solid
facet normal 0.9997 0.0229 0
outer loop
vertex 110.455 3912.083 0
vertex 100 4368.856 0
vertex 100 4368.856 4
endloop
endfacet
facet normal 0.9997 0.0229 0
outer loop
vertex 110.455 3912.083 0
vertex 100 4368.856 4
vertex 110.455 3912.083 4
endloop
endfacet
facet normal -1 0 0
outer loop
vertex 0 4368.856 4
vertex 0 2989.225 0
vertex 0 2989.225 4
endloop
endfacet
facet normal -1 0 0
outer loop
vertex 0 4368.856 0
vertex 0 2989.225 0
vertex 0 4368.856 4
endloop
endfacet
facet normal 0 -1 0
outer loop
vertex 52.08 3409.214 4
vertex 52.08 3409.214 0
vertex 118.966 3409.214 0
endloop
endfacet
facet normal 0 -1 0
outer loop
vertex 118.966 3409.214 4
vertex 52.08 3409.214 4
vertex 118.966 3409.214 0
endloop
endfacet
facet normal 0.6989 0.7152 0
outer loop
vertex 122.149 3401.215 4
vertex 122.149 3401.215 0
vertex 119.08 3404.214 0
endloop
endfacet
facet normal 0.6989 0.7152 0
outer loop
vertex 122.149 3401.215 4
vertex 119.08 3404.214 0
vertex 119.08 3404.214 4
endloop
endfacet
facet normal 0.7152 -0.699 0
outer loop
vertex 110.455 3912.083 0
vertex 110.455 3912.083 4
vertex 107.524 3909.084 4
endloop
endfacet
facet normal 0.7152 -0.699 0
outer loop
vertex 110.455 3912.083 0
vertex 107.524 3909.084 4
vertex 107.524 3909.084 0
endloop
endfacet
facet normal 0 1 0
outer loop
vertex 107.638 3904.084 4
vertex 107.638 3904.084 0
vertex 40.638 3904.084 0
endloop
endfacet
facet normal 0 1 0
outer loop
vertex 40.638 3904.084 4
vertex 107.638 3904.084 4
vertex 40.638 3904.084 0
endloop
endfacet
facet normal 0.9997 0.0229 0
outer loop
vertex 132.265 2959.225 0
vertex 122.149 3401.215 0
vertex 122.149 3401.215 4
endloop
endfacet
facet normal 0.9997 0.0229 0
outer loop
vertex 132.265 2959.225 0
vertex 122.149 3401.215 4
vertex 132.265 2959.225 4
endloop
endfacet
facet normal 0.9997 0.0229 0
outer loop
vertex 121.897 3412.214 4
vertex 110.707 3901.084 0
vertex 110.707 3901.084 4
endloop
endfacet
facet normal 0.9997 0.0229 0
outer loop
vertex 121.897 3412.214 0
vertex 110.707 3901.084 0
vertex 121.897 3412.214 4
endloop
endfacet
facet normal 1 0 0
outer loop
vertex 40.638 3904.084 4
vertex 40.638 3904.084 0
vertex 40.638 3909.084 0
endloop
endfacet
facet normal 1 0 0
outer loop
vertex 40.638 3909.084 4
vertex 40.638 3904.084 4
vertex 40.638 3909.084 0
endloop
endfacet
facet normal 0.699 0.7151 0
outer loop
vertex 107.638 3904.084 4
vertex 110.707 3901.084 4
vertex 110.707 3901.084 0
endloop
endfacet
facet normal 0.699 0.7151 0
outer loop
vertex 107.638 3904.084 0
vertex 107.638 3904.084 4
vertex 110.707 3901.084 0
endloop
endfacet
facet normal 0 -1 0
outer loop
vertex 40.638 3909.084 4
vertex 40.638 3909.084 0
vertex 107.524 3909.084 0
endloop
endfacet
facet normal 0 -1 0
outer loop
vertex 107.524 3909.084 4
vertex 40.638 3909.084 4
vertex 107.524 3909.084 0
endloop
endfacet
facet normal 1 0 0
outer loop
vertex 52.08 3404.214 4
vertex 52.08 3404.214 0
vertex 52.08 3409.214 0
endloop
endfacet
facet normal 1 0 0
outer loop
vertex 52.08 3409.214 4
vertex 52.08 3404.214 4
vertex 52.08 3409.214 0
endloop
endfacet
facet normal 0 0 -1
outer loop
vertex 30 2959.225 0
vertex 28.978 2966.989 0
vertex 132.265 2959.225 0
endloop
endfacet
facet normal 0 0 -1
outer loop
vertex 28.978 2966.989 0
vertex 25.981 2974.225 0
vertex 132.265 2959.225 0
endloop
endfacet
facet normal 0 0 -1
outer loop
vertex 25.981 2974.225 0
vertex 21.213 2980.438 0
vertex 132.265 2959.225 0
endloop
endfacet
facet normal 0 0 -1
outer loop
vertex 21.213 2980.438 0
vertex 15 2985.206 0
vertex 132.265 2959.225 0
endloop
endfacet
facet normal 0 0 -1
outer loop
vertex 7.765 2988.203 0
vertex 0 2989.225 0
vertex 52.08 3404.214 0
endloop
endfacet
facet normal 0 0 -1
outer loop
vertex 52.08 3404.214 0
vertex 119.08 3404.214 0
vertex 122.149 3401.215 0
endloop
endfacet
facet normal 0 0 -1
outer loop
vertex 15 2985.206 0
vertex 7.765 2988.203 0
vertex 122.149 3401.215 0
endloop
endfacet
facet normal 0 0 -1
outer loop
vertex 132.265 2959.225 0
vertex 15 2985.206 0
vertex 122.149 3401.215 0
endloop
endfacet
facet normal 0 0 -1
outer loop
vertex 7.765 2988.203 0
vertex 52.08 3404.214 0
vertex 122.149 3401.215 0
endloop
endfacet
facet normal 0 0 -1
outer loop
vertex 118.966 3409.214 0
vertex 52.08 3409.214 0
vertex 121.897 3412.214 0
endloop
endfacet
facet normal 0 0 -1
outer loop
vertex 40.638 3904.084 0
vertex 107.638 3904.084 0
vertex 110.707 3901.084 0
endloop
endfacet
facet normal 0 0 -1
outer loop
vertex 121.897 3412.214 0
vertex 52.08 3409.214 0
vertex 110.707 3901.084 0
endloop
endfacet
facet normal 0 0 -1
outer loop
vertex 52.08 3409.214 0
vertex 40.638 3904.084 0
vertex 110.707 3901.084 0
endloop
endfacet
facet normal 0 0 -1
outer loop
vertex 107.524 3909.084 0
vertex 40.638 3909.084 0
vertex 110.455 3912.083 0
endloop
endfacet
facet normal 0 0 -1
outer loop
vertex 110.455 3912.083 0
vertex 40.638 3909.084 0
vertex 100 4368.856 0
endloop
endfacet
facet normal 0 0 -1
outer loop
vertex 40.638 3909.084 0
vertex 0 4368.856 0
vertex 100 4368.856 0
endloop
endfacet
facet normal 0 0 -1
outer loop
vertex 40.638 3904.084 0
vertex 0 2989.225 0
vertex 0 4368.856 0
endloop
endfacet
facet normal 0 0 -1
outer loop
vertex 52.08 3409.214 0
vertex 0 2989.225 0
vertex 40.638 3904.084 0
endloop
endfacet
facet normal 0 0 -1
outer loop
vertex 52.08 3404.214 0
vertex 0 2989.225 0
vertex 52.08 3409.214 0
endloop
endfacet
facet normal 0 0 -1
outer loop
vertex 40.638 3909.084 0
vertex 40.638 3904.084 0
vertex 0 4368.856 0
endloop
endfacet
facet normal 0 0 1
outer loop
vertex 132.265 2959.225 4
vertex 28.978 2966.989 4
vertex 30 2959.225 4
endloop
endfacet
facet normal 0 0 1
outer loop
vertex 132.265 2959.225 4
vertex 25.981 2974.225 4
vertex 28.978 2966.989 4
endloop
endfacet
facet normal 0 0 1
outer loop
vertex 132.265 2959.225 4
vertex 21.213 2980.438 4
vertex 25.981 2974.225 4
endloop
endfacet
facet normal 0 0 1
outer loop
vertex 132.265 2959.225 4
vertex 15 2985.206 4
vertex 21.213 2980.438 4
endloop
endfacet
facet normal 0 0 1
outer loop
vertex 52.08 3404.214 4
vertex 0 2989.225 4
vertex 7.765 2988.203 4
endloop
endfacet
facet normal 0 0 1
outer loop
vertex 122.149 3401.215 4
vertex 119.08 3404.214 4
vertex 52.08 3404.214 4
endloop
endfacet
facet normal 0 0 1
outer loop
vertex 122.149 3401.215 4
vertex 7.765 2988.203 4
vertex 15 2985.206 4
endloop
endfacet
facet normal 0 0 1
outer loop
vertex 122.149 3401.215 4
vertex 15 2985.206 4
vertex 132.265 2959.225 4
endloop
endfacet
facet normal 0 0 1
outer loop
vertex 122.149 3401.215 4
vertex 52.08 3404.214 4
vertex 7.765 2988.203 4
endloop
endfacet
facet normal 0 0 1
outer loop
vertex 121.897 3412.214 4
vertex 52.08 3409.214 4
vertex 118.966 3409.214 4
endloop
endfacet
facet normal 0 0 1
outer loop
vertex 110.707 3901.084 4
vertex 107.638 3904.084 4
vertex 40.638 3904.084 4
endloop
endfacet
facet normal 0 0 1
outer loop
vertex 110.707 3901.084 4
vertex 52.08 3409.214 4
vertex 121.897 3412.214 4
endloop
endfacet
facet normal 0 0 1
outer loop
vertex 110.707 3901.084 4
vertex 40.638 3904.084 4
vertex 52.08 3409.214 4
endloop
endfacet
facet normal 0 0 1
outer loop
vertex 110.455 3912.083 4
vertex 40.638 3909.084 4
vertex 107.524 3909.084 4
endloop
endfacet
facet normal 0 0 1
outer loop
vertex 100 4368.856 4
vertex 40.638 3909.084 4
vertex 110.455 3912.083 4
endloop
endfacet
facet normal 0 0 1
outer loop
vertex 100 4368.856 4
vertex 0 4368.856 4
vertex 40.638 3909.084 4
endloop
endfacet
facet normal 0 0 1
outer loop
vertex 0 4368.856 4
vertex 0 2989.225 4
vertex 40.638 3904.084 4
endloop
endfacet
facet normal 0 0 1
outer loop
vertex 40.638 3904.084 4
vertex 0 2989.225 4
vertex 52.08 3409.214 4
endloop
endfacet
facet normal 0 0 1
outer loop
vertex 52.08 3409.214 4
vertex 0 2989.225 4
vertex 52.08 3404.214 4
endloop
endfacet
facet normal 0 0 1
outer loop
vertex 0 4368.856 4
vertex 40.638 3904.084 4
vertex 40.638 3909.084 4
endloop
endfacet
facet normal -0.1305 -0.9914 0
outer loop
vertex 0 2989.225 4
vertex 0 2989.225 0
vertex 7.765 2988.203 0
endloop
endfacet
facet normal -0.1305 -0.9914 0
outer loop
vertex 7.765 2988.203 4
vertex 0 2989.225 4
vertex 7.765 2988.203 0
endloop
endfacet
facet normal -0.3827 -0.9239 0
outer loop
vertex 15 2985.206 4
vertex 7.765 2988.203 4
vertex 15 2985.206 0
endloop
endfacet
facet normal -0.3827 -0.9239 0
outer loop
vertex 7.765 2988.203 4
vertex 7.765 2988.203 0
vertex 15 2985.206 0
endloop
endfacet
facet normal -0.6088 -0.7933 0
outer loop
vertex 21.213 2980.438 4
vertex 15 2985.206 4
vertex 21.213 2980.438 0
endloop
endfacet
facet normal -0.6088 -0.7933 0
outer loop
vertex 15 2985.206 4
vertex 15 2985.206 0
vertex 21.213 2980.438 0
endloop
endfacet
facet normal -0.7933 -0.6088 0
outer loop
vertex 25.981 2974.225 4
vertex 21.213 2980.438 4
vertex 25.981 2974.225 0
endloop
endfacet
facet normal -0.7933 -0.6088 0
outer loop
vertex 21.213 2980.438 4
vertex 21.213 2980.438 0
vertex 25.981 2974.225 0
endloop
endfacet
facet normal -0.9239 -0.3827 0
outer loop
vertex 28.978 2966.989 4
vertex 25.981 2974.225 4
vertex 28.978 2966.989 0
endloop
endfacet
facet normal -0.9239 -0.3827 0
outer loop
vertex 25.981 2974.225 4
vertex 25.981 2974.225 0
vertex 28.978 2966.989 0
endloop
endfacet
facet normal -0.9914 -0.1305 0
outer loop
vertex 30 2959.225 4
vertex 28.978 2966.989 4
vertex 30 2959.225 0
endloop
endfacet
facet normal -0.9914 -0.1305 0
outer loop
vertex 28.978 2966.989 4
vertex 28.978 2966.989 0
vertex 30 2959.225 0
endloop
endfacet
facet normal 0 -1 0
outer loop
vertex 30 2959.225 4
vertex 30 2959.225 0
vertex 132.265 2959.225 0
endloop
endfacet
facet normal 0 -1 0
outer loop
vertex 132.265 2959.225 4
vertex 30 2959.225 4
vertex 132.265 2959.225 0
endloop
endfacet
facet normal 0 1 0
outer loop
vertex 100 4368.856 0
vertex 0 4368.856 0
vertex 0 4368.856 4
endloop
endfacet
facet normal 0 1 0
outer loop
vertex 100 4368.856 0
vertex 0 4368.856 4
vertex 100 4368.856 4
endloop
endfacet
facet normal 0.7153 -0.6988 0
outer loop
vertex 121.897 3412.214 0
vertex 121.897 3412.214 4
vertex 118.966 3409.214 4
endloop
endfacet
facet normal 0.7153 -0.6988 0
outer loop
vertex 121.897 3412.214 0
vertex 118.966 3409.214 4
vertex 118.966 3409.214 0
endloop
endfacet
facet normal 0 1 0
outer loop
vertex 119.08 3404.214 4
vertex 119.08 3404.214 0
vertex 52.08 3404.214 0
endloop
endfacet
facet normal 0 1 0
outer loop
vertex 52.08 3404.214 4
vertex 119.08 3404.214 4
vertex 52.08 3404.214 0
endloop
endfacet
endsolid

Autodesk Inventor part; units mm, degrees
ref_plane "YZ Plane" through (0, 0, 0) normal (1, 0, 0) x (0, 1, 0)
ref_plane "XZ Plane" through (0, 0, 0) normal (0, 1, 0) x (-1, 0, 0)
ref_plane "XY Plane" through (0, 0, 0) normal (0, 0, 1) x (1, 0, 0)
sketch "Sketch1" plane through (0, 0, 0) normal (0, 0, 1) x (1, 0, 0)
  line L0 (0, 0) -> (0, 4368.8557)
  line L1 (0, 4368.8557) -> (100, 4368.8557)
  line L2 (100, 4368.8557) -> (200, 0)
  line L3 (200, 0) -> (0, 0)
  circle A0 centre (0, 0) radius 30
  line L4 (0, 1479.6125) -> (166.1327, 1479.6125)
  line L5 (0, 2959.2249) -> (132.2654, 2959.2249)
  circle A1 centre (0, 1479.6125) radius 30
  circle A2 centre (0, 2959.2249) radius 30
  line L6 (190.7298, 405) -> (120.7298, 405)
  line L7 (120.7298, 405) -> (120.7298, 410)
  line L8 (120.7298, 410) -> (190.7298, 410)
  line L9 (190.7298, 410) -> (190.7298, 405)
  line L10 (109.2882, 909.8691) -> (179.2882, 909.8691)
  line L11 (179.2882, 904.8691) -> (109.2882, 904.8691)
  line L12 (109.2882, 904.8691) -> (109.2882, 909.8691)
  line L13 (179.2882, 909.8691) -> (179.2882, 904.8691)
  line L14 (97.8465, 1409.7381) -> (167.8465, 1409.7381)
  line L15 (167.8465, 1404.7381) -> (97.8465, 1404.7381)
  line L16 (97.8465, 1404.7381) -> (97.8465, 1409.7381)
  line L17 (167.8465, 1409.7381) -> (167.8465, 1404.7381)
  line L18 (86.4049, 1909.6072) -> (156.4049, 1909.6072)
  line L19 (156.4049, 1904.6072) -> (86.4049, 1904.6072)
  line L20 (86.4049, 1904.6072) -> (86.4049, 1909.6072)
  line L21 (156.4049, 1909.6072) -> (156.4049, 1904.6072)
  line L22 (74.9632, 2409.4763) -> (144.9632, 2409.4763)
  line L23 (144.9632, 2404.4763) -> (74.9632, 2404.4763)
  line L24 (74.9632, 2404.4763) -> (74.9632, 2409.4763)
  line L25 (144.9632, 2409.4763) -> (144.9632, 2404.4763)
  line L26 (63.5216, 2909.3454) -> (133.5216, 2909.3454)
  line L27 (133.5216, 2904.3454) -> (63.5216, 2904.3454)
  line L28 (63.5216, 2904.3454) -> (63.5216, 2909.3454)
  line L29 (133.5216, 2909.3454) -> (133.5216, 2904.3454)
  line L30 (52.08, 3409.2144) -> (122.08, 3409.2144)
  line L31 (122.08, 3404.2144) -> (52.08, 3404.2144)
  line L32 (52.08, 3404.2144) -> (52.08, 3409.2144)
  line L33 (122.08, 3409.2144) -> (122.08, 3404.2144)
  line L34 (40.6383, 3909.0835) -> (110.6383, 3909.0835)
  line L35 (110.6383, 3904.0835) -> (40.6383, 3904.0835)
  line L36 (40.6383, 3904.0835) -> (40.6383, 3909.0835)
  line L37 (110.6383, 3909.0835) -> (110.6383, 3904.0835)
  line L38 (0, 1629.6125) -> (162.6993, 1629.6125)
  line L39 (0, 3079.2249) -> (129.5187, 3079.2249)
  point P0 (30, 2959.2249)
  point P1 (0, 2929.2249)
  point P2 (0, 1509.6125)
  point P3 (0, 1449.6125)
  point P4 (0, 30)
  point P5 (30, 0)
  point P6 (190.6154, 410)
  point P7 (179.2882, 904.8691)
  point P8 (179.1737, 909.8691)
  point P9 (167.8465, 1404.7381)
  point P10 (167.7321, 1409.7381)
  point P11 (30, 1479.6125)
  point P12 (156.4049, 1904.6072)
  point P13 (156.2904, 1909.6072)
  point P14 (144.9632, 2404.4763)
  point P15 (144.8488, 2409.4763)
  point P16 (133.5216, 2904.3454)
  point P17 (133.4072, 2909.3454)
  point P18 (0, 2989.2249)
  point P19 (122.08, 3404.2144)
  point P20 (121.9655, 3409.2144)
  point P21 (110.6383, 3904.0835)
  point P22 (110.5239, 3909.0835)
  dimension "d65" = 100
  dimension "d67" = 200
  dimension "d68" = 60
  dimension "d69" = 1480
  dimension "d70" = 1480
  dimension "d71" = 1410
  dimension "d72" = 5
  dimension "d73" = 70
  dimension "d74" = 410
  dimension "d77" = 500
  dimension "d82" = 120
  dimension "d83" = 150
extrude "Plate3" add sketch "Sketch1" along normal blind 4 contours L39 L2 L5 A2 L0 | L0 L1 L2 L34 L36 L35 L30 L32 L31 L39
chamfer "Corner Chamfer2" distance 3 angle 45 4 edges at (122.08, 3404.2144, 2) (121.9655, 3409.2144, 2) (110.6383, 3904.0835, 2) (110.5239, 3909.0835, 2)
equation "\"BendRadius\" = Thickness"
equation "\"BendReliefWidth\" = Thickness"
equation "\"BendReliefDepth\" = 0.5 * Thickness"
equation "\"CornerReliefSize\" = 4 * Thickness"
equation "\"MinimumRemnant\" = 2 * Thickness"
equation "\"TransitionRadius\" = BendRadius"
equation "\"JacobiRadiusSize\" = BendRadius"
equation "\"GapSize\" = Thickness"
equation "\"Thickness\" = 4"
properties part number "GBK 3311 central third rib_CPY1" material "Steel"
